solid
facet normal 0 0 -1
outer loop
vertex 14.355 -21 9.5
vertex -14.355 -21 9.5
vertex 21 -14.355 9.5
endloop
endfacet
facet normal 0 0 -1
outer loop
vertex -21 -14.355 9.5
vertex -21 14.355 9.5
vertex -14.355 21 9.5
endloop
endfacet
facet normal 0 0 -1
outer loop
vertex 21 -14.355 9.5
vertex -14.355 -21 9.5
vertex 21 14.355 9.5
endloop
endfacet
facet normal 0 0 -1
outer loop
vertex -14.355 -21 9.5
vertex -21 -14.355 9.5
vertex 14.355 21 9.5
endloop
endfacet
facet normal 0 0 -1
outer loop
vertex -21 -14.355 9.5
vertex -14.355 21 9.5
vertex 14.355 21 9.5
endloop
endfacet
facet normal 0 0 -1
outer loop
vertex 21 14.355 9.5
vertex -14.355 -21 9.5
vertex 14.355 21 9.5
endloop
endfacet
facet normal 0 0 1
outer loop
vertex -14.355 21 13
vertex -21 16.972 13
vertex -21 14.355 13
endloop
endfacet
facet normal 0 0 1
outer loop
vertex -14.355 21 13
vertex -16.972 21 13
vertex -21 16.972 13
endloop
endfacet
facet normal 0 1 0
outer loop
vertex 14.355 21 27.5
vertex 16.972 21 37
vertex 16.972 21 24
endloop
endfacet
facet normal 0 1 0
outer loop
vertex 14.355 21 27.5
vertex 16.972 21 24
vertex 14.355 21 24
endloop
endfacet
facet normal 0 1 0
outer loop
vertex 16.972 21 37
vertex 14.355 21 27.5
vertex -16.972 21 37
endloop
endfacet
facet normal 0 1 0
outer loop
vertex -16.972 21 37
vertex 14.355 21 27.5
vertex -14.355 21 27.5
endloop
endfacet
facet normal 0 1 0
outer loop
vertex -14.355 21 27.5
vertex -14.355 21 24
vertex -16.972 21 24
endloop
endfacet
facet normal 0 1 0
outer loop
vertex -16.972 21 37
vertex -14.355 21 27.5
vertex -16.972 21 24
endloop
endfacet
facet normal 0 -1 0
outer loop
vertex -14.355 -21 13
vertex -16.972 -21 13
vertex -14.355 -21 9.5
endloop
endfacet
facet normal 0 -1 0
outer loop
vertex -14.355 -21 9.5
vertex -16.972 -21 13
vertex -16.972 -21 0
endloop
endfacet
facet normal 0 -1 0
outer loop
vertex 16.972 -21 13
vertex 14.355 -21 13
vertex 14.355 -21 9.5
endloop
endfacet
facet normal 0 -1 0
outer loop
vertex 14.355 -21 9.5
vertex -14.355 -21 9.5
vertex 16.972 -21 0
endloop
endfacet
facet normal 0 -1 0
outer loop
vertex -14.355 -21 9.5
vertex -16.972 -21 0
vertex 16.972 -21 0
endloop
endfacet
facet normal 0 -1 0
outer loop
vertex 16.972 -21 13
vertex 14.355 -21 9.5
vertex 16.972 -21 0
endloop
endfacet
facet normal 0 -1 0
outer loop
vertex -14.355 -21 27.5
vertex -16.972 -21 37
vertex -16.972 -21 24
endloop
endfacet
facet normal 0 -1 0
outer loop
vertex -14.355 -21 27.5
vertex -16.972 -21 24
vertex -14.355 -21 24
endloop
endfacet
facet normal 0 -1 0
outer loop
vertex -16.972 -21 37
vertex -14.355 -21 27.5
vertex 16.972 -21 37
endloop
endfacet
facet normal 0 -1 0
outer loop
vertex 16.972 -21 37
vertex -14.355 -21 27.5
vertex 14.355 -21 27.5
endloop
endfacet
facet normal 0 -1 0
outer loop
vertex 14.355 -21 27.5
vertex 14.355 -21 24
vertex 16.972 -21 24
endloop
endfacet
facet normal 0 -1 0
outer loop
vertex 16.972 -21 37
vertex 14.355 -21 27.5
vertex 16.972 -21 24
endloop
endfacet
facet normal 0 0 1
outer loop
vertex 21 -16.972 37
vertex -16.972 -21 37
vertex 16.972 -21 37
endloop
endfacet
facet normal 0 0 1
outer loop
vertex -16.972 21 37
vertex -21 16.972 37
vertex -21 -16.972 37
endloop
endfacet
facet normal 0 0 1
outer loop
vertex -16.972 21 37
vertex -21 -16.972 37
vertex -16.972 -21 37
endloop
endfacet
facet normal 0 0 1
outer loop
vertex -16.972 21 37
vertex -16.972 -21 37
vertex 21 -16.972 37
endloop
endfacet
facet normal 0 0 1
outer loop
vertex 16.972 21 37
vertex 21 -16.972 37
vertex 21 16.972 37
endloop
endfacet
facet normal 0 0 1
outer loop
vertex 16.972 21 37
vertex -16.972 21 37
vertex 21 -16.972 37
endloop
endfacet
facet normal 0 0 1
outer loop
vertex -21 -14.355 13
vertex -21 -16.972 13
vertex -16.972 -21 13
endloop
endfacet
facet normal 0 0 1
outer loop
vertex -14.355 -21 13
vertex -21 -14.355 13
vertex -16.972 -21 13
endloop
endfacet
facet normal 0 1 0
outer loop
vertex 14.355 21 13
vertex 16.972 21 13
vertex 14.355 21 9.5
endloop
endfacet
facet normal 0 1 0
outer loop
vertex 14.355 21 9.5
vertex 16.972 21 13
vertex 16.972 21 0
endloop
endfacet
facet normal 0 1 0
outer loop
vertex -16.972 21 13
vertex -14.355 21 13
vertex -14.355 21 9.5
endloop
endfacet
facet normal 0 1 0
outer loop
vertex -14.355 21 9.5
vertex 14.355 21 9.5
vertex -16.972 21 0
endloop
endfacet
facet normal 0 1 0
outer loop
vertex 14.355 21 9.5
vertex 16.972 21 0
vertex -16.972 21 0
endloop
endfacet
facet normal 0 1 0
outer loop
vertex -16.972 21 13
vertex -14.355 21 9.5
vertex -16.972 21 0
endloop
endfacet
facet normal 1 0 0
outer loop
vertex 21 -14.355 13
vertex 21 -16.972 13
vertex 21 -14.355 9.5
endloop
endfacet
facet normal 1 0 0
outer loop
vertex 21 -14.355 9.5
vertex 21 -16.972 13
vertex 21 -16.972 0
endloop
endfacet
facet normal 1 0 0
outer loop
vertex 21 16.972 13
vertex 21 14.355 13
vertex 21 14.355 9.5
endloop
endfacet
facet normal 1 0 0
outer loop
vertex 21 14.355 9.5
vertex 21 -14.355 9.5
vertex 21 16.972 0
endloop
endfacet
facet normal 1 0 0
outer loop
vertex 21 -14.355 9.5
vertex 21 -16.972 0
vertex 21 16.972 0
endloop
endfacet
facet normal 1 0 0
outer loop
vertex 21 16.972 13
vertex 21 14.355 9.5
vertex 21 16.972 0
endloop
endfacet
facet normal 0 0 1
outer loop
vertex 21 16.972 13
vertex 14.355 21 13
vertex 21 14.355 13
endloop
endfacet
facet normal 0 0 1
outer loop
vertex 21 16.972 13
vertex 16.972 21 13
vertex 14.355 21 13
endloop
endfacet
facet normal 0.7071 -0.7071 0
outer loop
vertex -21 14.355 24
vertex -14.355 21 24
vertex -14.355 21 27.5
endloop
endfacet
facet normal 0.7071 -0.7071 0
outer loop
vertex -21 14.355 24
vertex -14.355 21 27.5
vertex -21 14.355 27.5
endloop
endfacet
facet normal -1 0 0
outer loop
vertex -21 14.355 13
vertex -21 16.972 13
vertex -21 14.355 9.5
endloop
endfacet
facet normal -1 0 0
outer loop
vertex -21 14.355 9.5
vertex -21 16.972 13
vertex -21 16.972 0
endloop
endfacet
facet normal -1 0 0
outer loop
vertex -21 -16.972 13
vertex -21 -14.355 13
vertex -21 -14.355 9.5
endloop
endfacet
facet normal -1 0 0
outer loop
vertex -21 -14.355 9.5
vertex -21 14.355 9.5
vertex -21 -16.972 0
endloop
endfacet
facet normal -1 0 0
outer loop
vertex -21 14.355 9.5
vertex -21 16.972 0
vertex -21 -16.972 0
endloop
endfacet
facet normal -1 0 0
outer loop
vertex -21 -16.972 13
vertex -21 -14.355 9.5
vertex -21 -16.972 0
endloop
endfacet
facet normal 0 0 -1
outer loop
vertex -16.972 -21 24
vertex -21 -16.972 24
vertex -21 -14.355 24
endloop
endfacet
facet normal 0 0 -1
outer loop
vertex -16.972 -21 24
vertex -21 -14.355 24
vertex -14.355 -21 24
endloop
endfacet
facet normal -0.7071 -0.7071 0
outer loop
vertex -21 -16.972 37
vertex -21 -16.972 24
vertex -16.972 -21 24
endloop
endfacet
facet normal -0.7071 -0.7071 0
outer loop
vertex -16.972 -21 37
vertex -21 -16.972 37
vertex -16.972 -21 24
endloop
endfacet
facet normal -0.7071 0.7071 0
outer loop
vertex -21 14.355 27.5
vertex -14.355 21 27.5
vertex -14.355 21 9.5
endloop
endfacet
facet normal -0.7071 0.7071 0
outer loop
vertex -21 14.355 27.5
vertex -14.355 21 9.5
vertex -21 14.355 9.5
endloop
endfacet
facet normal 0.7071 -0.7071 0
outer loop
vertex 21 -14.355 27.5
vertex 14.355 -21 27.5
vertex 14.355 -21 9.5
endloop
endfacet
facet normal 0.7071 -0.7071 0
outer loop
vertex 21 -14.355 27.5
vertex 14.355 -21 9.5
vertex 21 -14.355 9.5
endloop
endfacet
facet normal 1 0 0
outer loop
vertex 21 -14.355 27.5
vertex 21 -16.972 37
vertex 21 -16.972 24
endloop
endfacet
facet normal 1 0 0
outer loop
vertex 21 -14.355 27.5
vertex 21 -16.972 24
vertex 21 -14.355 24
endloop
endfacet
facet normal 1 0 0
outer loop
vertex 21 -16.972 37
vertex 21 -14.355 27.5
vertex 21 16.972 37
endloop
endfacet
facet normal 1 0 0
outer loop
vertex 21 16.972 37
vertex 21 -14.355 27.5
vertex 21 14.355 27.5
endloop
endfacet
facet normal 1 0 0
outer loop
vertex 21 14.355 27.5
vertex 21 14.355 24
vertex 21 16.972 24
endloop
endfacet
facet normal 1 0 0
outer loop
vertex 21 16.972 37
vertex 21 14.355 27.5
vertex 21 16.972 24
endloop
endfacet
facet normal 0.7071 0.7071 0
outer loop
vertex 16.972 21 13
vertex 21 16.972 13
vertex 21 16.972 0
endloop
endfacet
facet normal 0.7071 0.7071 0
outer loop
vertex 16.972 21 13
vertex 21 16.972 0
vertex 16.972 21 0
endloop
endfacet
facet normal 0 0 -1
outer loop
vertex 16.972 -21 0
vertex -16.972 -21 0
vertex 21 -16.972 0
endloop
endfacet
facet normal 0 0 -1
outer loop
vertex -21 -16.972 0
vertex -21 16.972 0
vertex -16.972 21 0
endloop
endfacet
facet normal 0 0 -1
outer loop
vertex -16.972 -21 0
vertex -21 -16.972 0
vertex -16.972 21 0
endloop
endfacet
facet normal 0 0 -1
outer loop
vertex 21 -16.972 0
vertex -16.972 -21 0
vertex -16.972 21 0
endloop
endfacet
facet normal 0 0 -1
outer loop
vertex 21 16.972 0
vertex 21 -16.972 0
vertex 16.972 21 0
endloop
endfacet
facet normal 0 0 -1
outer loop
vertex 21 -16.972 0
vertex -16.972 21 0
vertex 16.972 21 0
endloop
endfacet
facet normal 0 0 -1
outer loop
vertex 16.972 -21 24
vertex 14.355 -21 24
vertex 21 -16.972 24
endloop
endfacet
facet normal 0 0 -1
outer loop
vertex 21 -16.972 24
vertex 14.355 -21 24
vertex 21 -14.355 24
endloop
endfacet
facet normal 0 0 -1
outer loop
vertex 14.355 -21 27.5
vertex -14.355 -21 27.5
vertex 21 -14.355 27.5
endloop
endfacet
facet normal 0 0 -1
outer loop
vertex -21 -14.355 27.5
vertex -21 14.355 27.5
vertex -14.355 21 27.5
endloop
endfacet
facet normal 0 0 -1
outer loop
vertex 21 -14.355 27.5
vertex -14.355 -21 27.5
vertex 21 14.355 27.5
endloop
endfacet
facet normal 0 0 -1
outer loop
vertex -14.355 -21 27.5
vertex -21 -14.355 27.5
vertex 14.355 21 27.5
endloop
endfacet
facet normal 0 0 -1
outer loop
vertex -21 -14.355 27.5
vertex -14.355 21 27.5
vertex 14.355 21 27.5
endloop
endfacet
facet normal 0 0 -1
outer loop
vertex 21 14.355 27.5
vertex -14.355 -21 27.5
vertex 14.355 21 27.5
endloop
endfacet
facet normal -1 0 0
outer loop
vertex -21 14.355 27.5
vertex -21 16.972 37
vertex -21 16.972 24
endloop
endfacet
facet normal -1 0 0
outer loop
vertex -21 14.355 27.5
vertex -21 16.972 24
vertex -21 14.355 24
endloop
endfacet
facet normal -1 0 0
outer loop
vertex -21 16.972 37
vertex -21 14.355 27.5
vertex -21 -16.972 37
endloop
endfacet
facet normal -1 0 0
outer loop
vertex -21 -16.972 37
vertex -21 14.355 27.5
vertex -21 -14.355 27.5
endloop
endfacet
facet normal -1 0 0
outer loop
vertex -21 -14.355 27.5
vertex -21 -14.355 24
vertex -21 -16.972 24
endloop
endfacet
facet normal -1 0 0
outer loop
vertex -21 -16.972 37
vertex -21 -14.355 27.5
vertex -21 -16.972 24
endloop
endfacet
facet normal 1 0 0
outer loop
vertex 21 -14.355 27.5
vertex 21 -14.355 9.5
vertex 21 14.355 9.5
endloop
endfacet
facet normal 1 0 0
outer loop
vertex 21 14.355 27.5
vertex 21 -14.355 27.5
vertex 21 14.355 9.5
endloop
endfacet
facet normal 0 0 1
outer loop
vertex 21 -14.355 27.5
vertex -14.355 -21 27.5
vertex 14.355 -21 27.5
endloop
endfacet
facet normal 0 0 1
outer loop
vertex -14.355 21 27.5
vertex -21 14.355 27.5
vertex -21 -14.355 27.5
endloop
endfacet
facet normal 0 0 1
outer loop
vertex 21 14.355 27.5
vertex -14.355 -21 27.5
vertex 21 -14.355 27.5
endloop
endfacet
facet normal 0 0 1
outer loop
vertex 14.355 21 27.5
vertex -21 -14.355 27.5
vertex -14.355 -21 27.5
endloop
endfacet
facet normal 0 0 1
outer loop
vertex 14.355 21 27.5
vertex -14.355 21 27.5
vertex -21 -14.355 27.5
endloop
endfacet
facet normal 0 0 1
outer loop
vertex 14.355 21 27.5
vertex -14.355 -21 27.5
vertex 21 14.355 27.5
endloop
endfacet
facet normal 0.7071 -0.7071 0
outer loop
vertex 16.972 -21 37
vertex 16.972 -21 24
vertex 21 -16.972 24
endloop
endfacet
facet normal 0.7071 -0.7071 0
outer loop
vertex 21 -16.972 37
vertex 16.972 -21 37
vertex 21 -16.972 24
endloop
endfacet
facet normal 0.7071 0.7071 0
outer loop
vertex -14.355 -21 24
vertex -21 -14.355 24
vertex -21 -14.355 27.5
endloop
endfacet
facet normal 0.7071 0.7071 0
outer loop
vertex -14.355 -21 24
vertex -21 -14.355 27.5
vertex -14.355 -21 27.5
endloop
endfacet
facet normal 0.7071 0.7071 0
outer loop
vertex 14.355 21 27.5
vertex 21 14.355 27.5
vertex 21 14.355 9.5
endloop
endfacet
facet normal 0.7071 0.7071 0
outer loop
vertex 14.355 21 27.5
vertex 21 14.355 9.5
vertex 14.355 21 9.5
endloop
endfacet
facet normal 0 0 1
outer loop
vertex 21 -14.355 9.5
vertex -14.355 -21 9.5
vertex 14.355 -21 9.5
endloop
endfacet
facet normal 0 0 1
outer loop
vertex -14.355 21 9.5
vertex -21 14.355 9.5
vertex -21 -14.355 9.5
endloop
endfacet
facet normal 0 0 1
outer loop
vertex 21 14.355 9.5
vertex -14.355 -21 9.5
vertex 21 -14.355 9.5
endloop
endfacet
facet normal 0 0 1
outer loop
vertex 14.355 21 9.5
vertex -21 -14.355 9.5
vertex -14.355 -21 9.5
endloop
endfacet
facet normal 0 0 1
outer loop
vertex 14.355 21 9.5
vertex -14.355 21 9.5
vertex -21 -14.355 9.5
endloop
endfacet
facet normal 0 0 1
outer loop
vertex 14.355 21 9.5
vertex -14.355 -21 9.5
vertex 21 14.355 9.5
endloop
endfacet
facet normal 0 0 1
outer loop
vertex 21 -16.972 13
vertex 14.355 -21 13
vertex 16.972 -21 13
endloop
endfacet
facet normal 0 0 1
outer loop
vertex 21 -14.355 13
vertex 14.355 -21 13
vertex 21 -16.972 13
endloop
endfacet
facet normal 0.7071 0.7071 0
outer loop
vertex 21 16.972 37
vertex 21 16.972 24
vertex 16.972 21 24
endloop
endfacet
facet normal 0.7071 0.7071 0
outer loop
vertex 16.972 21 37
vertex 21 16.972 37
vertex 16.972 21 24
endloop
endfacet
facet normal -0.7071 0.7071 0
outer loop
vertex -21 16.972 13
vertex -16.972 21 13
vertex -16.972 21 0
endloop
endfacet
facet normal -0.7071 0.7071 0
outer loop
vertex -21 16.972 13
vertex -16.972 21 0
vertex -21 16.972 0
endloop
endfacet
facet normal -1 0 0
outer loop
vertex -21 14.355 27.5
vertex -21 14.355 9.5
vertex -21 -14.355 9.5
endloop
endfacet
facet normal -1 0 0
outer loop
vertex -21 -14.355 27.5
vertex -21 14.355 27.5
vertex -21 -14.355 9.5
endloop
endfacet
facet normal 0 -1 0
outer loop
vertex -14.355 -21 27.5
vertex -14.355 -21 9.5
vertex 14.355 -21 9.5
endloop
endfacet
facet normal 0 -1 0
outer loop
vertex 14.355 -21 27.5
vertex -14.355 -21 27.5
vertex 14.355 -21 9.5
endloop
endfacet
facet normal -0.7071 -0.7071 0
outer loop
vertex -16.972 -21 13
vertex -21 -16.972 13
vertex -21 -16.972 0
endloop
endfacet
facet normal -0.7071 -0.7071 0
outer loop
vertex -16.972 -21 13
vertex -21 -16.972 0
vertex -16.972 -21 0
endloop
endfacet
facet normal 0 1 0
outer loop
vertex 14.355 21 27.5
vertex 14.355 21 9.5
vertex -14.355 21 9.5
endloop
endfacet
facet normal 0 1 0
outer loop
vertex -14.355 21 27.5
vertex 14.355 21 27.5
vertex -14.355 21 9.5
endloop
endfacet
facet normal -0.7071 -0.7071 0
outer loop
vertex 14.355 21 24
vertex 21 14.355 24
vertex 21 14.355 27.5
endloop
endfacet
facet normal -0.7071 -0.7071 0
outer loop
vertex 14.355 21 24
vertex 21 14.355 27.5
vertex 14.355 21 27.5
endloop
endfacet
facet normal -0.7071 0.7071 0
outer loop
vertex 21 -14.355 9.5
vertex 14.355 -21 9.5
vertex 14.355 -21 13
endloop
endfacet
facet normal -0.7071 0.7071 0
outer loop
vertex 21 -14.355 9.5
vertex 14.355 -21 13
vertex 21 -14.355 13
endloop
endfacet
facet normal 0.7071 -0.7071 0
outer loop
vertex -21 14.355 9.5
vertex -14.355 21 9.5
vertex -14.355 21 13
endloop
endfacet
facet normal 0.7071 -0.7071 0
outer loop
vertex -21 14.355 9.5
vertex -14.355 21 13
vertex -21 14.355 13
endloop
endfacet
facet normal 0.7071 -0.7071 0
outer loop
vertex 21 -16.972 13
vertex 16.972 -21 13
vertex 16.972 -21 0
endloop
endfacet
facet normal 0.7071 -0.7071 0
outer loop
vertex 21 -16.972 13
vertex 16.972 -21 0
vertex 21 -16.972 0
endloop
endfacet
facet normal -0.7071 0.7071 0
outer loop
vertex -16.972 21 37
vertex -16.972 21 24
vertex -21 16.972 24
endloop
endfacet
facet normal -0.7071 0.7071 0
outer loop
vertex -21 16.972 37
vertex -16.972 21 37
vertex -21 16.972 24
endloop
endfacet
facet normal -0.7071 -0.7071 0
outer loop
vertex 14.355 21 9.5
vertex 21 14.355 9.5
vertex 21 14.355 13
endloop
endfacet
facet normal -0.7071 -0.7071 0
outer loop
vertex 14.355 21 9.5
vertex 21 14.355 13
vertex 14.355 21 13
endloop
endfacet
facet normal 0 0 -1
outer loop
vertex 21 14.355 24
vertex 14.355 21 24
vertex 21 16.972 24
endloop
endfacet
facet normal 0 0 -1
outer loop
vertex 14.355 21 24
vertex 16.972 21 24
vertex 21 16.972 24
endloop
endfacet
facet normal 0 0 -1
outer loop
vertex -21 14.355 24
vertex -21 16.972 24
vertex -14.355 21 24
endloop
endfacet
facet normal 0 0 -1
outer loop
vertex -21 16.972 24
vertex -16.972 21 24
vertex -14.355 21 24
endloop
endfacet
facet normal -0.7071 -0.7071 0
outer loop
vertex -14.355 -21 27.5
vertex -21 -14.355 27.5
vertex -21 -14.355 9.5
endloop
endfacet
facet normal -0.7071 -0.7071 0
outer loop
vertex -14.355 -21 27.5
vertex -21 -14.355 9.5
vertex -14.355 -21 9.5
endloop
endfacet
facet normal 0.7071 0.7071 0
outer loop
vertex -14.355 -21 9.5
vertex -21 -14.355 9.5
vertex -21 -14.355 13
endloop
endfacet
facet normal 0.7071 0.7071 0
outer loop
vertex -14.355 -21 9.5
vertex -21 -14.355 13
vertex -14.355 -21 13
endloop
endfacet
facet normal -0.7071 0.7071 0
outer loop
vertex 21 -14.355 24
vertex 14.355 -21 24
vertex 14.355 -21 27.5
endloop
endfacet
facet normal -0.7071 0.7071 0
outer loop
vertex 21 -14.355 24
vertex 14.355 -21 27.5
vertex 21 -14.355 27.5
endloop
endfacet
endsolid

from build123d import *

# Parameters (mm, degrees)
F1_DEPTH = 13
F4_DEPTH = 18
F8_DEPTH = 13


with BuildPart() as f1:
    # F0 (on Top) → F1 (new body)
    with BuildSketch(Plane.XY):
        Polygon((-16.971634, -21), (16.971634, -21), (21, -16.971634), (21, 16.971634), (16.971634, 21), (-16.971634, 21), (-21, 16.971634), (-21, -16.971634), align=None)
    extrude(amount=F1_DEPTH)


with BuildPart() as f4:
    # F3 (on offset) → F4 (new body)
    with BuildSketch(Plane.XY.offset(9.5)):
        Polygon((-14.355339, -21), (14.355339, -21), (21, -14.355339), (21, 14.355339), (14.355339, 21), (-14.355339, 21), (-21, 14.355339), (-21, -14.355339), align=None)
    extrude(amount=F4_DEPTH)


with BuildPart() as f1_1:
    add(f1.part)

    # F5: cut F4
    add(f4.part, mode=Mode.SUBTRACT)


with BuildPart() as f8:
    # F7 (on offset) → F8 (new body)
    with BuildSketch(Plane.XY.offset(24)):
        Polygon((-16.971634, -21), (16.971634, -21), (21, -16.971634), (21, 16.971634), (16.971634, 21), (-16.971634, 21), (-21, 16.971634), (-21, -16.971634), align=None)
    extrude(amount=F8_DEPTH)

    # F9: cut F4
    add(f4.part, mode=Mode.SUBTRACT)


solid = Compound([f4.part, f1_1.part, f8.part])
